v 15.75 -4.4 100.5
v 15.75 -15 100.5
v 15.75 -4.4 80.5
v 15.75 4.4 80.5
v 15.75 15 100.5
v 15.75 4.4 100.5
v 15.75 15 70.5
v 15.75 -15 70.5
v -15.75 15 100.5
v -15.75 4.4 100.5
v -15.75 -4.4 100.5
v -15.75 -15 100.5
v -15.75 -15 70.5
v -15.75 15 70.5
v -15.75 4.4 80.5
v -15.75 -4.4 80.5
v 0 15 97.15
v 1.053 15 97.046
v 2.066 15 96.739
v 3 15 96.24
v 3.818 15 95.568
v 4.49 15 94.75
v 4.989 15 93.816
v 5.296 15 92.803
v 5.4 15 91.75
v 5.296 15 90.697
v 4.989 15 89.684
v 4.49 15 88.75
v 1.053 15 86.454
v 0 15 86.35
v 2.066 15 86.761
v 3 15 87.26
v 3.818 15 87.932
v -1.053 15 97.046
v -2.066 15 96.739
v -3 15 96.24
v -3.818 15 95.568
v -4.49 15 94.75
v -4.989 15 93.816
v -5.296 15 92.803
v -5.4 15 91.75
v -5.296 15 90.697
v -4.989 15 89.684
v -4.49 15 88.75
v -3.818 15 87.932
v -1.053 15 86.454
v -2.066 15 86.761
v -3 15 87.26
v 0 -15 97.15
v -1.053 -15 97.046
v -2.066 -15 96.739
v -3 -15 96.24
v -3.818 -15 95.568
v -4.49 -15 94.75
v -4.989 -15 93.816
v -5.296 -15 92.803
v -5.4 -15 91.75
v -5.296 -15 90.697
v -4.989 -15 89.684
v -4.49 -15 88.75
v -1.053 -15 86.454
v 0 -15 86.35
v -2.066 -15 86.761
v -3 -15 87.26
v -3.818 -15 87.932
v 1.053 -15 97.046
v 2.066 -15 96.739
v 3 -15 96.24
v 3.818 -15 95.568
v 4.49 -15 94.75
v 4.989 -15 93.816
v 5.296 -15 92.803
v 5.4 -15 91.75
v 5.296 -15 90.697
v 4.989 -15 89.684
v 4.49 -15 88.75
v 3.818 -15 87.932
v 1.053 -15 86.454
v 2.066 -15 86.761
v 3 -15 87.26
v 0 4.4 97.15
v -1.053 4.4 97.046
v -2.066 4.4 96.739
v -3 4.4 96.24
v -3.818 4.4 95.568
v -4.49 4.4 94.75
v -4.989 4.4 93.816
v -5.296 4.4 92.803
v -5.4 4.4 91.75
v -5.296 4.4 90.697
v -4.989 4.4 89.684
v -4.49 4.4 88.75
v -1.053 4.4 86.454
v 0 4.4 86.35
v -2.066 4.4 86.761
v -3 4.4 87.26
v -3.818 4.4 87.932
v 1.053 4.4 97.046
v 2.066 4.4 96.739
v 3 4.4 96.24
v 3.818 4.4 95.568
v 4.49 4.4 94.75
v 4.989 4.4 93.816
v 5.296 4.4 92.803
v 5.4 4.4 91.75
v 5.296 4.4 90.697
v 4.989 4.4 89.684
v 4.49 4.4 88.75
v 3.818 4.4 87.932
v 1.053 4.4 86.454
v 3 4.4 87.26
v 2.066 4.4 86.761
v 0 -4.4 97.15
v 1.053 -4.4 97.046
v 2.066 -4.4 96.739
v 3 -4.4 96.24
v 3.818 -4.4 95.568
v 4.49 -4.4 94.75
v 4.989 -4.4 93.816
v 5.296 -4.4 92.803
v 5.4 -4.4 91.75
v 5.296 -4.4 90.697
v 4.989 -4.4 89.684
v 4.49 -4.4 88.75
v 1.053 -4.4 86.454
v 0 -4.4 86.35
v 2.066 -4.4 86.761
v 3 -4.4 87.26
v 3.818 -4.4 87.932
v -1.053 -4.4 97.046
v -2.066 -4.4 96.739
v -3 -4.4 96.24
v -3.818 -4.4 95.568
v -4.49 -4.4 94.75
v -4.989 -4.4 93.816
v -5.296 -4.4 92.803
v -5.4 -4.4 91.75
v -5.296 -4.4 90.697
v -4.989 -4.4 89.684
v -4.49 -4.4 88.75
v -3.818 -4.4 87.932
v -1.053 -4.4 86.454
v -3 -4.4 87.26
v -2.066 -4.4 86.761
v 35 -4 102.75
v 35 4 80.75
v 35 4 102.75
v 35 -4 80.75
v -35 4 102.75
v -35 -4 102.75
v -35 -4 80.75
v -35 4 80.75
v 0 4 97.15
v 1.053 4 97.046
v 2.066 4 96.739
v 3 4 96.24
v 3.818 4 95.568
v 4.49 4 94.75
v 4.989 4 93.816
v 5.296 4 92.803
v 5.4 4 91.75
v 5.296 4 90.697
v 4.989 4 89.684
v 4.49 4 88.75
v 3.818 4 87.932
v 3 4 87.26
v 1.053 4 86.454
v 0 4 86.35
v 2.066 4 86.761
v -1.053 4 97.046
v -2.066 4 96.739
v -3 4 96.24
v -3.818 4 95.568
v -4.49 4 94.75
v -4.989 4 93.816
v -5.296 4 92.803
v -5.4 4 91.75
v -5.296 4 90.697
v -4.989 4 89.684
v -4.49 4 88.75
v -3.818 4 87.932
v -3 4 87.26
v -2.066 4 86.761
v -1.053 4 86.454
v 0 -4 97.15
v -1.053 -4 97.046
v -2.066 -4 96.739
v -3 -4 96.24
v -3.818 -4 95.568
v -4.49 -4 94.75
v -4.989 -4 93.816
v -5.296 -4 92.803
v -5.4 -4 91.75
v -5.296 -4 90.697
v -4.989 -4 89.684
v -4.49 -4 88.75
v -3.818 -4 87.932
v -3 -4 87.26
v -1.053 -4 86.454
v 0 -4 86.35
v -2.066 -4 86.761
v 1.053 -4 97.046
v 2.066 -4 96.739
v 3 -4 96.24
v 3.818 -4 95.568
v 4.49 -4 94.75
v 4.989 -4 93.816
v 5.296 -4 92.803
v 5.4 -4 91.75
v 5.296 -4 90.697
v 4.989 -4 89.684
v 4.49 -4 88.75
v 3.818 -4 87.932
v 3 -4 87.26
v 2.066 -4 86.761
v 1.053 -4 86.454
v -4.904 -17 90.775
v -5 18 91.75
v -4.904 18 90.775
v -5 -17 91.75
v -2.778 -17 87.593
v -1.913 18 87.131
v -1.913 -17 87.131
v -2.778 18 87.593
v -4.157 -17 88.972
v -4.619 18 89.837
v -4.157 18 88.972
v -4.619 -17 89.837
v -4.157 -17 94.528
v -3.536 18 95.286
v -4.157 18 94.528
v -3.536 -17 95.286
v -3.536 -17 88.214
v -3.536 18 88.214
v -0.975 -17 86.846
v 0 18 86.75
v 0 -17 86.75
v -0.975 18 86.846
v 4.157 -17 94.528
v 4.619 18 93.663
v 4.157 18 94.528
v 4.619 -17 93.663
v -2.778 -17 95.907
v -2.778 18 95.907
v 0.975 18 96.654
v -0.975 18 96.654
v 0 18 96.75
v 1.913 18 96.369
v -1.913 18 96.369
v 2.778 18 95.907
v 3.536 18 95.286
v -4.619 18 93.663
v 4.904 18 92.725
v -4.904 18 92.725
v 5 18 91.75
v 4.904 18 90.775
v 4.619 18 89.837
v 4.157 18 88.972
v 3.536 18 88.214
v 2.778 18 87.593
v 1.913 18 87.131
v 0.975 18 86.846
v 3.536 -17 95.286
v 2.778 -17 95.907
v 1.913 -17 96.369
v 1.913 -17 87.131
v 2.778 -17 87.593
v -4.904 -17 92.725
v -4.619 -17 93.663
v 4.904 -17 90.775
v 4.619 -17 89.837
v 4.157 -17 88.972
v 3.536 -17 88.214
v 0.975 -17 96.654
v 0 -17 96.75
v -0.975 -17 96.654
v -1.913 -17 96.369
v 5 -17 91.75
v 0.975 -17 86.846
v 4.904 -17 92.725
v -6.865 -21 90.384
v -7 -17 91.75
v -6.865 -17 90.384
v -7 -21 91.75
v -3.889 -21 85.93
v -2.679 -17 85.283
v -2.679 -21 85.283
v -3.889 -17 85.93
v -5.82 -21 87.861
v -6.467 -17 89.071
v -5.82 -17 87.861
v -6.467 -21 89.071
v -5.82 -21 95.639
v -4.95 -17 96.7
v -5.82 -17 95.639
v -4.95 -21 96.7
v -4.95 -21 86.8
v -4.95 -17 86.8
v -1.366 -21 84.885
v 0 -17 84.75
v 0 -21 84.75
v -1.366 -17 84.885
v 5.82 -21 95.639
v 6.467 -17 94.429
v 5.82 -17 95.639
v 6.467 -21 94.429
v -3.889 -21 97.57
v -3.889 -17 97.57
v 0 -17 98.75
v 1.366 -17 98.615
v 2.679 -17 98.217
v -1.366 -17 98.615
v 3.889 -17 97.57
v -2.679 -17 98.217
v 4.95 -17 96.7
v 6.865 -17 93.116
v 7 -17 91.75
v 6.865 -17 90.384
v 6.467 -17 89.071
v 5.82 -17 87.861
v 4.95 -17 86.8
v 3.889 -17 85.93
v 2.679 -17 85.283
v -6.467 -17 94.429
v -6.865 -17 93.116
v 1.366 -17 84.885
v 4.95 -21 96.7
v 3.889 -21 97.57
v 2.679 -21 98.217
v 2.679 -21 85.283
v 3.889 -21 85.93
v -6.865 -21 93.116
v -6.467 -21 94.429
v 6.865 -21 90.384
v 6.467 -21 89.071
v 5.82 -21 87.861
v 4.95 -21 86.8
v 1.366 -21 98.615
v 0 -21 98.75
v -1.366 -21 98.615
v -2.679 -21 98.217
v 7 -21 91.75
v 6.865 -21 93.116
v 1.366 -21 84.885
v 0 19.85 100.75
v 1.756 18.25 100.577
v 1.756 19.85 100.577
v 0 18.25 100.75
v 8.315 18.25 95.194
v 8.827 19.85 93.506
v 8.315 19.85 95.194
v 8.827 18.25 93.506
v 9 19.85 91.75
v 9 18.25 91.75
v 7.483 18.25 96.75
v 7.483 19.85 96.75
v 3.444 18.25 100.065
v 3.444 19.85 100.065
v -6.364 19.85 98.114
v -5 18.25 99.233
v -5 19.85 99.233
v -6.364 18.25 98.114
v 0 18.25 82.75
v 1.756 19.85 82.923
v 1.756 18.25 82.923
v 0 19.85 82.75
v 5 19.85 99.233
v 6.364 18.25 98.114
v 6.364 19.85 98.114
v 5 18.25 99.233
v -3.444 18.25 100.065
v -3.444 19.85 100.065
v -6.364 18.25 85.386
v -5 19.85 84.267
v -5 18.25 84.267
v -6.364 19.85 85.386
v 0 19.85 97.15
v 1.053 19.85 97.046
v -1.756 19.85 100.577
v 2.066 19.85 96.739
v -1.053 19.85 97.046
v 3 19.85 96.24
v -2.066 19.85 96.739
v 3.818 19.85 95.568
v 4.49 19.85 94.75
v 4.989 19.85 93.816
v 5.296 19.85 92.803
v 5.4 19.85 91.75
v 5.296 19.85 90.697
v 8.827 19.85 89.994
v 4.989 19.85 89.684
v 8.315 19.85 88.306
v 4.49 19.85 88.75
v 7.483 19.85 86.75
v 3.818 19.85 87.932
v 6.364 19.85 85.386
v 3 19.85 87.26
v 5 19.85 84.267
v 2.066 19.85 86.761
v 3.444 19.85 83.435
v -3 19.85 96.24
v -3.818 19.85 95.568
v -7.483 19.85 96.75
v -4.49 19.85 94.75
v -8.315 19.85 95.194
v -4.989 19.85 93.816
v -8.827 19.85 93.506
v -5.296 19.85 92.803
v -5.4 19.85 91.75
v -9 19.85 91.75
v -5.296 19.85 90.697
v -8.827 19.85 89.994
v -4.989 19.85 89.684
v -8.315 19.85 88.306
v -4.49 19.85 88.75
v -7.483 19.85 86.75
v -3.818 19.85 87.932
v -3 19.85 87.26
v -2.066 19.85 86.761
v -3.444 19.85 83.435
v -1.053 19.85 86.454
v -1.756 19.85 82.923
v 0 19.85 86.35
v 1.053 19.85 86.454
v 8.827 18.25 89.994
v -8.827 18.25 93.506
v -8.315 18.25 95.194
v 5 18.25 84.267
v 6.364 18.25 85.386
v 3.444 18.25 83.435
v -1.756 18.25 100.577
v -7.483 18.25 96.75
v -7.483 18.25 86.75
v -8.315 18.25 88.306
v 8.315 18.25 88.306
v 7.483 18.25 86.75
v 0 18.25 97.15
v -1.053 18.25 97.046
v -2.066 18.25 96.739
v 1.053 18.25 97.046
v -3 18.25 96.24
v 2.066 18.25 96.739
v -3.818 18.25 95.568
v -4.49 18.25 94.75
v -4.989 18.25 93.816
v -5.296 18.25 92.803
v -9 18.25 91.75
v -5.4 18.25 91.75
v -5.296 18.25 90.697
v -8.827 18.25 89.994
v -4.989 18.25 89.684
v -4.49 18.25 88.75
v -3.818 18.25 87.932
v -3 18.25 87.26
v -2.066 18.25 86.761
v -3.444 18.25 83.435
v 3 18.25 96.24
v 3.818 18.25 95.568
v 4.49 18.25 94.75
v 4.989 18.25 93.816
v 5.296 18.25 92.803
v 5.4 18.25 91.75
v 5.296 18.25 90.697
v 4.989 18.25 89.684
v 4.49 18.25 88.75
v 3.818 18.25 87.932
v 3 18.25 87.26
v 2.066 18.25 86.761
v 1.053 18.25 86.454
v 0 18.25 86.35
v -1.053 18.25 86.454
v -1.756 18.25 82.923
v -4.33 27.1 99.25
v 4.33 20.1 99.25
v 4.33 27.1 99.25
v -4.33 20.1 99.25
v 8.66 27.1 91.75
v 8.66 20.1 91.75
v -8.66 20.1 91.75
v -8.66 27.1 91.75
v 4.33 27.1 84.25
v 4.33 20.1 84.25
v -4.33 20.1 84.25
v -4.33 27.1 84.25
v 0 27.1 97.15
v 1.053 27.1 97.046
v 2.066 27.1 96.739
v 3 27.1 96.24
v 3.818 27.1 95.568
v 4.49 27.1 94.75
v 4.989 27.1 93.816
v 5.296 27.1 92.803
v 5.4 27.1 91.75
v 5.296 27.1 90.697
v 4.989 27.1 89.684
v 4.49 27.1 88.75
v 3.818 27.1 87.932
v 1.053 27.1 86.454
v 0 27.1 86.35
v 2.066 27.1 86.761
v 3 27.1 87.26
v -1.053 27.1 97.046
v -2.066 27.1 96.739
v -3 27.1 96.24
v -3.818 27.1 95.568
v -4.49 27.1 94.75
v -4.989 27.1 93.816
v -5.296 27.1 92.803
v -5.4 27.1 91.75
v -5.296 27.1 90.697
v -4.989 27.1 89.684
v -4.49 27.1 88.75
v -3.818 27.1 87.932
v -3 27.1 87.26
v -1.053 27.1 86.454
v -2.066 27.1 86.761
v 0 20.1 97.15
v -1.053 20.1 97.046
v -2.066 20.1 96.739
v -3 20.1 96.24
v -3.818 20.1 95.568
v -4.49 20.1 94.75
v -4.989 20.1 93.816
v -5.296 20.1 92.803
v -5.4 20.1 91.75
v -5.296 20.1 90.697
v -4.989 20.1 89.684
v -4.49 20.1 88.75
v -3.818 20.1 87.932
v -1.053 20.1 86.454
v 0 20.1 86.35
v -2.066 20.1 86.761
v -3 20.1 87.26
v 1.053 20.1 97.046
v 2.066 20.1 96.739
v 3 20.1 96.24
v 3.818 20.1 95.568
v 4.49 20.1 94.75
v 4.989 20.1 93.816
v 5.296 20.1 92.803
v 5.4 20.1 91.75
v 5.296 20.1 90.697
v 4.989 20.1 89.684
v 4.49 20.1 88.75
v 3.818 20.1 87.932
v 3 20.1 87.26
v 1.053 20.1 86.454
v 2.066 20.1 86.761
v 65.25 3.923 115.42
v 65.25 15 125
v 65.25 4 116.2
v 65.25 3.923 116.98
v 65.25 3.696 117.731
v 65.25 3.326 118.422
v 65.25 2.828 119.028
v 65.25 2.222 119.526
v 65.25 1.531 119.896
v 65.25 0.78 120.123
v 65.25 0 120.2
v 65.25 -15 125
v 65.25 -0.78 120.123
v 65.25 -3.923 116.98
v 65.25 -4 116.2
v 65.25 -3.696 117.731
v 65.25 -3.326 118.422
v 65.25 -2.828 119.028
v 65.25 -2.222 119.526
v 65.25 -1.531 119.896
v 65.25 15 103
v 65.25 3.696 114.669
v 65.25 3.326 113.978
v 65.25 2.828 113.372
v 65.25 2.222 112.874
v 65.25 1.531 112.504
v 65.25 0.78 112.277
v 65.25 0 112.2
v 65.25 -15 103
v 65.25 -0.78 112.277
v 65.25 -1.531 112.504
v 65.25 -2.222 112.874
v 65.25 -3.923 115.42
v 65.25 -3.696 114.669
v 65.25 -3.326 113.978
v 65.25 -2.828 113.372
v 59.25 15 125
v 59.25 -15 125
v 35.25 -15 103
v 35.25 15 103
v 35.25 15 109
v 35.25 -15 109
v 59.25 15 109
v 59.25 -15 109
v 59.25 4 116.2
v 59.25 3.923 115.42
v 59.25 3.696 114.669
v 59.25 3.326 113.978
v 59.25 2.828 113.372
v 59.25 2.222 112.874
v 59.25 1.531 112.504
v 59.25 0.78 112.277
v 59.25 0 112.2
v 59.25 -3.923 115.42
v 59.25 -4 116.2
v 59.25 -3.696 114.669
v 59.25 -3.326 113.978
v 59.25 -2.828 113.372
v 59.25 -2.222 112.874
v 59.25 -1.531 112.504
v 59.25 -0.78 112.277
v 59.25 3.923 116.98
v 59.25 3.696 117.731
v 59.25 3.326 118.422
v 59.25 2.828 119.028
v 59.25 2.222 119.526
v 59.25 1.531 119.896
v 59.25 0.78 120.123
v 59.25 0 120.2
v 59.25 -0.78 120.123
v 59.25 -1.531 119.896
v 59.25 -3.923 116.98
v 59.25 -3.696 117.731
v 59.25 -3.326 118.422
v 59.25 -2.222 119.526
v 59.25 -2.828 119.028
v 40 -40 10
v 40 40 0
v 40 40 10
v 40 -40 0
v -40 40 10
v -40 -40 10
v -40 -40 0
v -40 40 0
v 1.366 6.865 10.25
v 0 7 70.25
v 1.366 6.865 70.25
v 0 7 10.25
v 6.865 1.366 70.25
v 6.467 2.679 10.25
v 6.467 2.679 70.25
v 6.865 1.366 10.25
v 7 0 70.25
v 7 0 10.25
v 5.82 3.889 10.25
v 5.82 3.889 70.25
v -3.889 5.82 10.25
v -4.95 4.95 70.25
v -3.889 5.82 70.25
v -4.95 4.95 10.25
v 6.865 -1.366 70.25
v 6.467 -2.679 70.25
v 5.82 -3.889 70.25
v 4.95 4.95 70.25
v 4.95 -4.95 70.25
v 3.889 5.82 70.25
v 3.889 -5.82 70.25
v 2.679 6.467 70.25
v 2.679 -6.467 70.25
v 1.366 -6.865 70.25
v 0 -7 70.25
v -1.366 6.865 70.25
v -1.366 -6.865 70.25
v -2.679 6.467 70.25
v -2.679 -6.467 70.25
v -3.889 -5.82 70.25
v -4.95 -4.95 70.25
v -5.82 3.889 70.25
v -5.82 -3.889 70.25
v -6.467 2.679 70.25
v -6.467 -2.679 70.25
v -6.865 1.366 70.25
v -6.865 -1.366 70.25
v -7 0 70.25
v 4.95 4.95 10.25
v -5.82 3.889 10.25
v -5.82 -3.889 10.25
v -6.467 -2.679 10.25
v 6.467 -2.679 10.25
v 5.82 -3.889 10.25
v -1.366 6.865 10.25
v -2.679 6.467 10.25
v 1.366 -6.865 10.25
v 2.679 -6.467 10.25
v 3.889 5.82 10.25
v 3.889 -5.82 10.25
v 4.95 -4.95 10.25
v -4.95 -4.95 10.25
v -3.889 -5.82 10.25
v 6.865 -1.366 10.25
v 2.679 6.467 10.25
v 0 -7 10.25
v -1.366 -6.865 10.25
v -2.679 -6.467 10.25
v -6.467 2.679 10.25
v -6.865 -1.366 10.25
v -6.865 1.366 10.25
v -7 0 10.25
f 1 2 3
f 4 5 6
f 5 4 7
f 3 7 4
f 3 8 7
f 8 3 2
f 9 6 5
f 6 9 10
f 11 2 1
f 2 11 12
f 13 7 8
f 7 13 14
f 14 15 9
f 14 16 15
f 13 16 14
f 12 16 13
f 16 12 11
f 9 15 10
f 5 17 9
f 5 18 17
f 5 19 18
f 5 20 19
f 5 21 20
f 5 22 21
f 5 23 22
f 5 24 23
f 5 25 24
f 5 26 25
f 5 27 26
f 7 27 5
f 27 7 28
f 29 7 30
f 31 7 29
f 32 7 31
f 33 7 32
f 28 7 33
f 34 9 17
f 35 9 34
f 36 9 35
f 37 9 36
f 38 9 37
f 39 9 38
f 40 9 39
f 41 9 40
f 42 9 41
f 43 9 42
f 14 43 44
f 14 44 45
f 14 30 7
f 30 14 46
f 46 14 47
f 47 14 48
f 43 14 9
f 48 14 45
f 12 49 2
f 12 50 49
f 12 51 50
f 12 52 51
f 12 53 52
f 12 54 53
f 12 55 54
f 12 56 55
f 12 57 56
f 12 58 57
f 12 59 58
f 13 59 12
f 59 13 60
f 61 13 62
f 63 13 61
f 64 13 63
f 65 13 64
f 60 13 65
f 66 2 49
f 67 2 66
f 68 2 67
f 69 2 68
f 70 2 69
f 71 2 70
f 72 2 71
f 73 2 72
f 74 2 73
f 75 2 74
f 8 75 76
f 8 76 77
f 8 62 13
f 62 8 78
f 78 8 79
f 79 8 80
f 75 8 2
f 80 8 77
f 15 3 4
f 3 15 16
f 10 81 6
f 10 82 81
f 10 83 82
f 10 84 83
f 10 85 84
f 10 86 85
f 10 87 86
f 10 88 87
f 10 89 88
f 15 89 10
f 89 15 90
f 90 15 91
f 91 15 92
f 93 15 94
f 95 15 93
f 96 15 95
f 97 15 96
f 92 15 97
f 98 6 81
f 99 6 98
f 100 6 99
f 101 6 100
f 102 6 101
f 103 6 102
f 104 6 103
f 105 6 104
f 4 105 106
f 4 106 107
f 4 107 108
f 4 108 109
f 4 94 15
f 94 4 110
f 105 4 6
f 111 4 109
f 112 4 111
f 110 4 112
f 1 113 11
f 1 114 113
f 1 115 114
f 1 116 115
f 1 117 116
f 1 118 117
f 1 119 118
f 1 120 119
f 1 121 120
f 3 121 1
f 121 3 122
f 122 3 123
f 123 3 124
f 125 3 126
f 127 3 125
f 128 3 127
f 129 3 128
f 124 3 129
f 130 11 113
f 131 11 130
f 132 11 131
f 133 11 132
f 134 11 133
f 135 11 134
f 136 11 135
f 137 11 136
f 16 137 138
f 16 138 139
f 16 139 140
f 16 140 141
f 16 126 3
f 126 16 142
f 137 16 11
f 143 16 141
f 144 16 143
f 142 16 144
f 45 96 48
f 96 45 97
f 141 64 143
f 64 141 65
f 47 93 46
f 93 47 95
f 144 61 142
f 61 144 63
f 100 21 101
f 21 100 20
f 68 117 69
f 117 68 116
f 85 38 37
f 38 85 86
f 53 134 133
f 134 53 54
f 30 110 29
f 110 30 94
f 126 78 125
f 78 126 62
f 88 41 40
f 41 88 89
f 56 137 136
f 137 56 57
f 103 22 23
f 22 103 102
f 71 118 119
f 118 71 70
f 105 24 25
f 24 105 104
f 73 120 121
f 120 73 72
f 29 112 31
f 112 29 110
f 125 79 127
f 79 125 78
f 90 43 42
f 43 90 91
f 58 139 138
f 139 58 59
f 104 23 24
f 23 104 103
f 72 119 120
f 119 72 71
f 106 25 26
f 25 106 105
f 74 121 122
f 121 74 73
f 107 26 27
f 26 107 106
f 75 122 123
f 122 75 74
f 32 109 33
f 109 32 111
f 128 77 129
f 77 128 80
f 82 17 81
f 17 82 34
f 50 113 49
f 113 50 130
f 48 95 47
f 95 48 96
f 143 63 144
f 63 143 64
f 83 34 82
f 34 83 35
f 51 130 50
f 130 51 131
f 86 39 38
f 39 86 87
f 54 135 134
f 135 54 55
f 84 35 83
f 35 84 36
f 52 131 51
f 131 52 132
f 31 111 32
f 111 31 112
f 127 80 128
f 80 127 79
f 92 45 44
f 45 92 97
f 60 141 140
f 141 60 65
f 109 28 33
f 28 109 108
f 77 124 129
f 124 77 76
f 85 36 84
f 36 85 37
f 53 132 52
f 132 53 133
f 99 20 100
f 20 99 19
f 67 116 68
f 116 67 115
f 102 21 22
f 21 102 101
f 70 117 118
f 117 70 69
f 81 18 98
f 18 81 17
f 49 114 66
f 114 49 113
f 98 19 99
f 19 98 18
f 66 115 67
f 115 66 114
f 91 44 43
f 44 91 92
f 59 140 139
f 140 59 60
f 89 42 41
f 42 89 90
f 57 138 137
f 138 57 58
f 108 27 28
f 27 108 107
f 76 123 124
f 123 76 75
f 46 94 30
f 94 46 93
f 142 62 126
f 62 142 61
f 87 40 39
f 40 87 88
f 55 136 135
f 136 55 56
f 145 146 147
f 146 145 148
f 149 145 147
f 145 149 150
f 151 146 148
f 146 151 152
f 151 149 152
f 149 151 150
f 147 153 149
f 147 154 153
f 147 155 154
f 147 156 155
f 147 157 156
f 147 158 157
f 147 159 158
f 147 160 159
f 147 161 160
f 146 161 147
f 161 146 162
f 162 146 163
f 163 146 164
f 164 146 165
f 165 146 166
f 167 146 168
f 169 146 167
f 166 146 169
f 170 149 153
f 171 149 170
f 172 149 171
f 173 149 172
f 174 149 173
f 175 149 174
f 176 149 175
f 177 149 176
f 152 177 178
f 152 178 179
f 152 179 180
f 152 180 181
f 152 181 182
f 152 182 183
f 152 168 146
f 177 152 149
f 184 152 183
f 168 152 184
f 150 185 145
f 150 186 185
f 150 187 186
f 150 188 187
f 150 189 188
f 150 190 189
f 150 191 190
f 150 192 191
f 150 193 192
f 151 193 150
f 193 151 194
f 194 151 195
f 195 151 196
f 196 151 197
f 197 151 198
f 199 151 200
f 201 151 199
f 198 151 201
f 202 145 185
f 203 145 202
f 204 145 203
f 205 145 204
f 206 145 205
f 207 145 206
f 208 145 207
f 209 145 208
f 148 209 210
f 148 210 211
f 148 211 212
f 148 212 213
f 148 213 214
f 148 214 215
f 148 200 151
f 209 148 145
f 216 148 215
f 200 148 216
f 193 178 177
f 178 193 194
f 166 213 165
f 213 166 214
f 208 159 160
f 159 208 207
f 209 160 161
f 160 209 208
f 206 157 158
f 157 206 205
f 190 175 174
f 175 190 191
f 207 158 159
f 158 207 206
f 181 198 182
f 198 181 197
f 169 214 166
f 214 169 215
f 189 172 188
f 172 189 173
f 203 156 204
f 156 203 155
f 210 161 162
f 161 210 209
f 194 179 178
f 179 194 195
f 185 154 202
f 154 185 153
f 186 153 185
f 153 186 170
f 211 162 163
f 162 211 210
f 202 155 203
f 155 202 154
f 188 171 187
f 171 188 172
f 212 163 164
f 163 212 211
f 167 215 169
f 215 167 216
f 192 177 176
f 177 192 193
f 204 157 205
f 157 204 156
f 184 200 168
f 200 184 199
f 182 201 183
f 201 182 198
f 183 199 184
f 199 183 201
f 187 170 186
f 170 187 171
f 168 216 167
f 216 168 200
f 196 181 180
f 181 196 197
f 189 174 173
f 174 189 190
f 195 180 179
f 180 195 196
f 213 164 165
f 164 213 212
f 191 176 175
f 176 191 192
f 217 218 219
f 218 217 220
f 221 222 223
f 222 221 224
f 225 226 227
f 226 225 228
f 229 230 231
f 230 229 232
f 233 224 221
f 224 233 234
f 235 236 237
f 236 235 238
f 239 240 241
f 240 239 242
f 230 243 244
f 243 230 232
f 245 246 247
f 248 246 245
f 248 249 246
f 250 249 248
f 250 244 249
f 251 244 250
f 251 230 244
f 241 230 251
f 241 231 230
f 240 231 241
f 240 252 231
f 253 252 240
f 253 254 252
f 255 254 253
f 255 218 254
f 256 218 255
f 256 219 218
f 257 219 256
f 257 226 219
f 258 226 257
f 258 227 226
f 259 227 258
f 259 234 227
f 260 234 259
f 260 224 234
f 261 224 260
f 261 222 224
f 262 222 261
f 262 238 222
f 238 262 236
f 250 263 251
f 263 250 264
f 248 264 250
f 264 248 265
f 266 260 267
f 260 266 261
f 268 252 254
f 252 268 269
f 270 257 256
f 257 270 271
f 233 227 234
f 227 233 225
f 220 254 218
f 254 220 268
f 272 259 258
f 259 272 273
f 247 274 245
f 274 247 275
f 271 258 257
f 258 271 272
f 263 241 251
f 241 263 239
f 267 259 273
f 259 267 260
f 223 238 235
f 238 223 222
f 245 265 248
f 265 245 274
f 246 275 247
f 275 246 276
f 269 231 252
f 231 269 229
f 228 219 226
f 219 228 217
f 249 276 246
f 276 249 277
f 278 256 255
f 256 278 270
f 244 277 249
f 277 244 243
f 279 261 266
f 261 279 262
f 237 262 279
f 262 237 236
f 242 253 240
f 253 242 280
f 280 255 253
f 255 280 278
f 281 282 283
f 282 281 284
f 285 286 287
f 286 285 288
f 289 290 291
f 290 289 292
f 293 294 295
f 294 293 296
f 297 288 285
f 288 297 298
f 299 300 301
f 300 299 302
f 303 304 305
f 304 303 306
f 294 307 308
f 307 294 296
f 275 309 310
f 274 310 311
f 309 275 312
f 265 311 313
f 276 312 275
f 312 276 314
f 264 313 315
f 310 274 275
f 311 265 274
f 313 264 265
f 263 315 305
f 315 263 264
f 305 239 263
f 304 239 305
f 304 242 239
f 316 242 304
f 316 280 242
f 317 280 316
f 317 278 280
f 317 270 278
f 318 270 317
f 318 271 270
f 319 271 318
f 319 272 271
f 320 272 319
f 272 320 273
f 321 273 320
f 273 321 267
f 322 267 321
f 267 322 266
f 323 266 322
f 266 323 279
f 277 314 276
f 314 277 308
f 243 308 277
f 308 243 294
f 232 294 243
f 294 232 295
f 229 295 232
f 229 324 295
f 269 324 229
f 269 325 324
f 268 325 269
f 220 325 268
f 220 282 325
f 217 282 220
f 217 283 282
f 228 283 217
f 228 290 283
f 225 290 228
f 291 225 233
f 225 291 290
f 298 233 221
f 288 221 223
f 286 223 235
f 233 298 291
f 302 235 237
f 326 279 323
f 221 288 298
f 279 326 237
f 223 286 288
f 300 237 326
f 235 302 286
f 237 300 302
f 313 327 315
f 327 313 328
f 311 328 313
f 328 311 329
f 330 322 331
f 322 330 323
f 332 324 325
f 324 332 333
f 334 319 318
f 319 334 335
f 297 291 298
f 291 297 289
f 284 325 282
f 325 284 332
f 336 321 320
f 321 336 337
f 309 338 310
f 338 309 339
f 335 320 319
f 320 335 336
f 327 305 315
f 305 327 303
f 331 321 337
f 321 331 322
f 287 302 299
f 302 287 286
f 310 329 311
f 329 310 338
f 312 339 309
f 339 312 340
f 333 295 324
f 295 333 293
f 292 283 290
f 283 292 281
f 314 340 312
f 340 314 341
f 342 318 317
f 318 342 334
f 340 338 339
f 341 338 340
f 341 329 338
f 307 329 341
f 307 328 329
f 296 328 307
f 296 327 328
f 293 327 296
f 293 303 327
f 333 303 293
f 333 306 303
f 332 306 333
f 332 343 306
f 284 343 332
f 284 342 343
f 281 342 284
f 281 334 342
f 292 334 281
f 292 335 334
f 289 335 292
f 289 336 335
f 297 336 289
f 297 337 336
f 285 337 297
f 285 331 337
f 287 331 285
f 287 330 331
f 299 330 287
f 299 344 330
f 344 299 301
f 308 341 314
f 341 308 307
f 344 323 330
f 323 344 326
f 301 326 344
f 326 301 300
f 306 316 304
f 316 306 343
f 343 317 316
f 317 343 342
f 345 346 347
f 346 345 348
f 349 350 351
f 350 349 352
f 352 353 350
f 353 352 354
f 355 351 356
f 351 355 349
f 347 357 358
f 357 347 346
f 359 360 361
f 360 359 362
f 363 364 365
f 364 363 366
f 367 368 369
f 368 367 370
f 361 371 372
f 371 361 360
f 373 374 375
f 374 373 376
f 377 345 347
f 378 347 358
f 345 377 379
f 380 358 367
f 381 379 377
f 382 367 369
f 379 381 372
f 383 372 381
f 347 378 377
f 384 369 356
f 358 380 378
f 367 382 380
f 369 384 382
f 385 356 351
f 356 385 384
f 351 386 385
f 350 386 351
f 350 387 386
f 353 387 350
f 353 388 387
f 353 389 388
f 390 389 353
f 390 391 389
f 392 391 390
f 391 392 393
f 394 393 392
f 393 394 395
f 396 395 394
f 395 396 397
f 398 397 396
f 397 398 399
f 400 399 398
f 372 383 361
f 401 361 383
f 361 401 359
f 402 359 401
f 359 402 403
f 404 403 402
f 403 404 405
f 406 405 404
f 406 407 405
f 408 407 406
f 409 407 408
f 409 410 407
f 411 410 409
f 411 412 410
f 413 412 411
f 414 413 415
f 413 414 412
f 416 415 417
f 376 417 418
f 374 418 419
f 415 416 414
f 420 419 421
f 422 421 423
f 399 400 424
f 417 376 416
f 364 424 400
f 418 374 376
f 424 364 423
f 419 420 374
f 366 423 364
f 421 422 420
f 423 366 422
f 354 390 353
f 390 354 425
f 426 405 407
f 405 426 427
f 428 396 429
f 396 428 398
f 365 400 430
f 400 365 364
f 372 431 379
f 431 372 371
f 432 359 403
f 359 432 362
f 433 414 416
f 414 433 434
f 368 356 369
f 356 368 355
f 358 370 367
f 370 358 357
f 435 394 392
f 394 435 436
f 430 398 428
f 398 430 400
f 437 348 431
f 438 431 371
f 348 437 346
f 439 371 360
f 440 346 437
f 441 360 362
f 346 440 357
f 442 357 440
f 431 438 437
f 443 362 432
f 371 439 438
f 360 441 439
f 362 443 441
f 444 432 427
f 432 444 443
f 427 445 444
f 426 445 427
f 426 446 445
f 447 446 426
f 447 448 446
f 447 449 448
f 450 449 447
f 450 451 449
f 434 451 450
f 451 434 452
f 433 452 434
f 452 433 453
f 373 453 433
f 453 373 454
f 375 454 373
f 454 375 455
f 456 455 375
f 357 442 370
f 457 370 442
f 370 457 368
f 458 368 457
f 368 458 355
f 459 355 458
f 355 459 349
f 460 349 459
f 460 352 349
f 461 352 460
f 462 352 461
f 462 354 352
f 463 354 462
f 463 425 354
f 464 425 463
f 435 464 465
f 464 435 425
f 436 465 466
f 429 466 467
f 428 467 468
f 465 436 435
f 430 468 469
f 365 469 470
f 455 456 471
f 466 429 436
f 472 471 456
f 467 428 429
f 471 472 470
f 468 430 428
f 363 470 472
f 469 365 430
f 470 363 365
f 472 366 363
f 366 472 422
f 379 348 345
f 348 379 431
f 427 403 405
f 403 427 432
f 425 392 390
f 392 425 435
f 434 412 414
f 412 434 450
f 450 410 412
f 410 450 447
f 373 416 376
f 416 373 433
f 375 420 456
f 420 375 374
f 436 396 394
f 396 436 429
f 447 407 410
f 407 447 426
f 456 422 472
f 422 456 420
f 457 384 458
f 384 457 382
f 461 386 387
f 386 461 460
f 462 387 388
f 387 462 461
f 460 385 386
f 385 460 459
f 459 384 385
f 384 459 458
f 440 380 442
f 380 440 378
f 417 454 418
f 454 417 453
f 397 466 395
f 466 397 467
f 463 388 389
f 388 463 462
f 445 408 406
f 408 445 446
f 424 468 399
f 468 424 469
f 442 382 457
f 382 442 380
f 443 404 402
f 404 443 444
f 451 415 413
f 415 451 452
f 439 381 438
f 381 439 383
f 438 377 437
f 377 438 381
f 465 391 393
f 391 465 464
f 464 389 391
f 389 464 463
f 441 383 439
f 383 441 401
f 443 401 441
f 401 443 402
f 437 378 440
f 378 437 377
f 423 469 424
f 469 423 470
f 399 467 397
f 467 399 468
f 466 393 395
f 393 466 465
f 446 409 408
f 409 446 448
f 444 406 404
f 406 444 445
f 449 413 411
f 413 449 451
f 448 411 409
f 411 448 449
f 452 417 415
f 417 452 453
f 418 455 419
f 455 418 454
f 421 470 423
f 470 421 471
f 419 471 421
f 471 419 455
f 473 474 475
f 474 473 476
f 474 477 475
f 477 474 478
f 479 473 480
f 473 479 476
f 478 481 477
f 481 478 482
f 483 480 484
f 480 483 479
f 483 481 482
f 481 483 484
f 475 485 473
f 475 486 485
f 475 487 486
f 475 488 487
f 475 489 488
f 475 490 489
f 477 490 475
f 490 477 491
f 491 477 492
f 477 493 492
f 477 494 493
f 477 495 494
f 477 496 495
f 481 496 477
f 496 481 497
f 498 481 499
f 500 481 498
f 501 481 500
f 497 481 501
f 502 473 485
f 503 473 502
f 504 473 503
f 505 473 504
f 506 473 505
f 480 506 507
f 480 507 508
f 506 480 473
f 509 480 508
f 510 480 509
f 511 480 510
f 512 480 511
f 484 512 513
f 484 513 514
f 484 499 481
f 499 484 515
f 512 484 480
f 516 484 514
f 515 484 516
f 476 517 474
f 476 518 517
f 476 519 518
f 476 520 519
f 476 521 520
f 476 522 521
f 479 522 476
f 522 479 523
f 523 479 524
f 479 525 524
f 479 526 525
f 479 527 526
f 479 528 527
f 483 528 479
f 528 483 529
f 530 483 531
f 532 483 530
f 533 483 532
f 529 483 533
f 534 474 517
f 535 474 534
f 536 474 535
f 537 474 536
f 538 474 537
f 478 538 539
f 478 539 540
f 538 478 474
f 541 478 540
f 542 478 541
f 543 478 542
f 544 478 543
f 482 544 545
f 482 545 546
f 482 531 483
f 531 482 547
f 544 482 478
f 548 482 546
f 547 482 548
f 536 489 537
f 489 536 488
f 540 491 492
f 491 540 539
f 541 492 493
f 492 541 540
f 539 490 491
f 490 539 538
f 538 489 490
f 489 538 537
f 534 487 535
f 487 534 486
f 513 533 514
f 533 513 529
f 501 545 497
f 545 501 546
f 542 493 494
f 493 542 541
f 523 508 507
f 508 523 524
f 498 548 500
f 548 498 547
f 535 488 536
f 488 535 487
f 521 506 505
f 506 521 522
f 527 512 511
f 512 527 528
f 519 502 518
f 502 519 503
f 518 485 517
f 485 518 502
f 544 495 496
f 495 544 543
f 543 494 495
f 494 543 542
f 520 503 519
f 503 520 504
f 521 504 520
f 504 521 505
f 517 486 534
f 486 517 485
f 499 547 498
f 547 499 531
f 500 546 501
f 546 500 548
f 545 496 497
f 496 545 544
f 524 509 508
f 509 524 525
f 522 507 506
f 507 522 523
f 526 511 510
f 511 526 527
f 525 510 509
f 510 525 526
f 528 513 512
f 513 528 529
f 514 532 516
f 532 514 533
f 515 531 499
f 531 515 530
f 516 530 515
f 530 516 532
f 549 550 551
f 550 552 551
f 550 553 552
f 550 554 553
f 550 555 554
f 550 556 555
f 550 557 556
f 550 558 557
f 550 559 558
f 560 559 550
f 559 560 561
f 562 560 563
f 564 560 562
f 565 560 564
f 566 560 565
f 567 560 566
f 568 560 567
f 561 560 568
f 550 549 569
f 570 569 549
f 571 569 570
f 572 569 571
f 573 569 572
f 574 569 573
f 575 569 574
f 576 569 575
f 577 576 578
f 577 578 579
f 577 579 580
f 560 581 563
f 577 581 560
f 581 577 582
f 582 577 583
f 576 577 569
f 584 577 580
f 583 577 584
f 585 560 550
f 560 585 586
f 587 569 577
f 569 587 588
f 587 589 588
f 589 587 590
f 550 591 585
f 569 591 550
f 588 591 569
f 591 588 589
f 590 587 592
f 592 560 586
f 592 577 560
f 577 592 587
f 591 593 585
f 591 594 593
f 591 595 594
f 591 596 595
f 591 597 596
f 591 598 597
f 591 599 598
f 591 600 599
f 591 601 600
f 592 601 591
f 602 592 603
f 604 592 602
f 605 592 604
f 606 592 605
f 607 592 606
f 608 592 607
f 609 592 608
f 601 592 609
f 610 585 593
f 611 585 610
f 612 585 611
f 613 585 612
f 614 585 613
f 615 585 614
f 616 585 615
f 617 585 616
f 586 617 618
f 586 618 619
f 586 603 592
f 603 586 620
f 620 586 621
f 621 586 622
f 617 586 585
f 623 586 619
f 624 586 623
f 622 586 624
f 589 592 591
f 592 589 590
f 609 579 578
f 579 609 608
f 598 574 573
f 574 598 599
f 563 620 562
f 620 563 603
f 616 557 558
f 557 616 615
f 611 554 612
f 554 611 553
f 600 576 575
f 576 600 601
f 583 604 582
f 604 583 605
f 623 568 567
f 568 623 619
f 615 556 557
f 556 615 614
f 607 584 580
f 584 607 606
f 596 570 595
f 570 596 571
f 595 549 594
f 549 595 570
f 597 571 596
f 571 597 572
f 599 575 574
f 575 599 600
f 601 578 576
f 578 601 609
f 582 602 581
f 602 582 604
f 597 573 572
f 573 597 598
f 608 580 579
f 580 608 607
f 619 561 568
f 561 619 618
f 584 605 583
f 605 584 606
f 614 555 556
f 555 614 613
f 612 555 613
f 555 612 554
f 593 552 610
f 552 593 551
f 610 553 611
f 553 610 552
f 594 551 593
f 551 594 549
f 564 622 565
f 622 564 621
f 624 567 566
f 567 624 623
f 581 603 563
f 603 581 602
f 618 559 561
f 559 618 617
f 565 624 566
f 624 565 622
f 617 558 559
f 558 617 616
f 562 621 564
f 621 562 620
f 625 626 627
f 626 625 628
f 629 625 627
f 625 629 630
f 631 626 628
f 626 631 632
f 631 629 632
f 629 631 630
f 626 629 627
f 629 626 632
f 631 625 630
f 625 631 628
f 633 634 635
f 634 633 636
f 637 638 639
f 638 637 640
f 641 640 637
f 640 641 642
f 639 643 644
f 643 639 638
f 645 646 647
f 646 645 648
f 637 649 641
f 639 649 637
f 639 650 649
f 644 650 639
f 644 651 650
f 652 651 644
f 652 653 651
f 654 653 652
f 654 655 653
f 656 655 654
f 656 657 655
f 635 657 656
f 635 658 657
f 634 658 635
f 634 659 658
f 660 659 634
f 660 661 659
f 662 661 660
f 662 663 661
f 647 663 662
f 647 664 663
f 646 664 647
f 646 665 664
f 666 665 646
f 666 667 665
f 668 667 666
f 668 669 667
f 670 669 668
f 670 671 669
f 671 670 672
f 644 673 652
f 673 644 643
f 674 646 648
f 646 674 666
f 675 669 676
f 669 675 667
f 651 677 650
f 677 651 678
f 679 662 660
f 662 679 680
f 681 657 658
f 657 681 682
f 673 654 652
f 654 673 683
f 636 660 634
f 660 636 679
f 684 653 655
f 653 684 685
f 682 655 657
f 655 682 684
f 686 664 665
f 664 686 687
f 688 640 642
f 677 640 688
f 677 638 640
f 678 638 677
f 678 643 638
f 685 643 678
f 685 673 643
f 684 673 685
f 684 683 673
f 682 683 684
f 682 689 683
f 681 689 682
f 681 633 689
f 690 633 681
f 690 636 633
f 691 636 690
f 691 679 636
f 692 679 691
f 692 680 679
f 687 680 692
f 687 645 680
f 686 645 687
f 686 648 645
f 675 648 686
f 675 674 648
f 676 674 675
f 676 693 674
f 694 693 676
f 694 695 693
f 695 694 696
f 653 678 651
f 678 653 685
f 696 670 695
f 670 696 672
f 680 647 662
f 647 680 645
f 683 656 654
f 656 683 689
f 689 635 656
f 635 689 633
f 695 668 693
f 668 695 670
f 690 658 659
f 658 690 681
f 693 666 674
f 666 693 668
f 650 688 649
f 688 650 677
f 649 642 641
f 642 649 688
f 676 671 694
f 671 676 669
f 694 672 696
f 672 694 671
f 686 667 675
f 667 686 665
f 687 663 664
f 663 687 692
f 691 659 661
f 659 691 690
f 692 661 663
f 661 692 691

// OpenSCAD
$fn = 32;

// ------------------------------------------------------------------------
// Lamp arm: column d14 x 60 mm, arm 70 mm
// Every part is its own module, assembly() places every instance.
// ------------------------------------------------------------------------

// --- part 1 ---
module lamp_base() {
  difference() {
    translate([-40, -40, 0]) cube([80, 80, 10]);
  }
}

// --- part 2 ---
module lamp_column() {
  cylinder(h = 60, d = 14);
}

// --- part 3 ---
module head_fork() {
  difference() {
    translate([-15.75, -15, 0]) cube([31.5, 30, 30]);
    translate([-16.75, -4.4, 10]) cube([33.5, 8.8, 21]);
    translate([0, 0, 21.25]) rotate([90, 0, 0]) cylinder(h = 32, d = 10.8, center = true);
  }
}

// --- part 4 ---
module lamp_arm() {
  difference() {
    translate([-35, -4, 0]) cube([70, 8, 22]);
    translate([0, 0, 11]) rotate([90, 0, 0]) cylinder(h = 10, d = 10.8, center = true);
  }
}

// --- part 5 ---
module arm_pin() {
  rotate([0, 90, 0]) cylinder(h = 36, d = 10, center = true);
  translate([-21, 0, 0]) rotate([0, 90, 0]) cylinder(h = 4, d = 14);
}

// --- part 6 ---
module arm_washer() {
  difference() {
      translate([0, 0, 0]) cylinder(h = 1.6, d = 18);
      translate([0, 0, -1]) cylinder(h = 3.6, d = 10.8);
    }
}

// --- part 7 ---
module arm_nut() {
  difference() {
    linear_extrude(height = 7) polygon(points = [[8.66, 0], [4.33, 7.5], [-4.33, 7.5], [-8.66, 0], [-4.33, -7.5], [4.33, -7.5]]);
    translate([0, 0, -1]) cylinder(h = 9, d = 10.8);
  }
}

// --- part 8 ---
module shade_bracket() {
  difference() {
    translate([-15, -15, 0]) cube([30, 30, 22]);
    translate([-16, -16, 6]) cube([25, 32, 17]);
    translate([12, 0, 13.2]) rotate([0, 90, 0]) cylinder(h = 8, d = 8, center = true);
  }
}

// --- assembly ---
module assembly() {
  color([0.80, 0.24, 0.20]) translate([0, 0, 0]) rotate([0, 0, 0]) lamp_base();
  color([0.20, 0.45, 0.75]) translate([0, 0, 10.25]) rotate([0, 0, 0]) lamp_column();
  color([0.25, 0.62, 0.32]) translate([0, 0, 70.5]) rotate([0, 0, 0]) head_fork();
  color([0.92, 0.70, 0.18]) translate([0, 0, 80.75]) rotate([0, 0, 0]) lamp_arm();
  color([0.58, 0.35, 0.70]) translate([0, 0, 91.75]) rotate([0, 0, 90]) arm_pin();
  color([0.16, 0.66, 0.66]) translate([0, 19.85, 91.75]) rotate([90, 0, 0]) arm_washer();
  color([0.85, 0.48, 0.18]) translate([0, 27.1, 91.75]) rotate([90, 0, 0]) arm_nut();
  color([0.55, 0.60, 0.65]) translate([50.25, 0, 103]) rotate([0, 0, 0]) shade_bracket();
}

assembly();
